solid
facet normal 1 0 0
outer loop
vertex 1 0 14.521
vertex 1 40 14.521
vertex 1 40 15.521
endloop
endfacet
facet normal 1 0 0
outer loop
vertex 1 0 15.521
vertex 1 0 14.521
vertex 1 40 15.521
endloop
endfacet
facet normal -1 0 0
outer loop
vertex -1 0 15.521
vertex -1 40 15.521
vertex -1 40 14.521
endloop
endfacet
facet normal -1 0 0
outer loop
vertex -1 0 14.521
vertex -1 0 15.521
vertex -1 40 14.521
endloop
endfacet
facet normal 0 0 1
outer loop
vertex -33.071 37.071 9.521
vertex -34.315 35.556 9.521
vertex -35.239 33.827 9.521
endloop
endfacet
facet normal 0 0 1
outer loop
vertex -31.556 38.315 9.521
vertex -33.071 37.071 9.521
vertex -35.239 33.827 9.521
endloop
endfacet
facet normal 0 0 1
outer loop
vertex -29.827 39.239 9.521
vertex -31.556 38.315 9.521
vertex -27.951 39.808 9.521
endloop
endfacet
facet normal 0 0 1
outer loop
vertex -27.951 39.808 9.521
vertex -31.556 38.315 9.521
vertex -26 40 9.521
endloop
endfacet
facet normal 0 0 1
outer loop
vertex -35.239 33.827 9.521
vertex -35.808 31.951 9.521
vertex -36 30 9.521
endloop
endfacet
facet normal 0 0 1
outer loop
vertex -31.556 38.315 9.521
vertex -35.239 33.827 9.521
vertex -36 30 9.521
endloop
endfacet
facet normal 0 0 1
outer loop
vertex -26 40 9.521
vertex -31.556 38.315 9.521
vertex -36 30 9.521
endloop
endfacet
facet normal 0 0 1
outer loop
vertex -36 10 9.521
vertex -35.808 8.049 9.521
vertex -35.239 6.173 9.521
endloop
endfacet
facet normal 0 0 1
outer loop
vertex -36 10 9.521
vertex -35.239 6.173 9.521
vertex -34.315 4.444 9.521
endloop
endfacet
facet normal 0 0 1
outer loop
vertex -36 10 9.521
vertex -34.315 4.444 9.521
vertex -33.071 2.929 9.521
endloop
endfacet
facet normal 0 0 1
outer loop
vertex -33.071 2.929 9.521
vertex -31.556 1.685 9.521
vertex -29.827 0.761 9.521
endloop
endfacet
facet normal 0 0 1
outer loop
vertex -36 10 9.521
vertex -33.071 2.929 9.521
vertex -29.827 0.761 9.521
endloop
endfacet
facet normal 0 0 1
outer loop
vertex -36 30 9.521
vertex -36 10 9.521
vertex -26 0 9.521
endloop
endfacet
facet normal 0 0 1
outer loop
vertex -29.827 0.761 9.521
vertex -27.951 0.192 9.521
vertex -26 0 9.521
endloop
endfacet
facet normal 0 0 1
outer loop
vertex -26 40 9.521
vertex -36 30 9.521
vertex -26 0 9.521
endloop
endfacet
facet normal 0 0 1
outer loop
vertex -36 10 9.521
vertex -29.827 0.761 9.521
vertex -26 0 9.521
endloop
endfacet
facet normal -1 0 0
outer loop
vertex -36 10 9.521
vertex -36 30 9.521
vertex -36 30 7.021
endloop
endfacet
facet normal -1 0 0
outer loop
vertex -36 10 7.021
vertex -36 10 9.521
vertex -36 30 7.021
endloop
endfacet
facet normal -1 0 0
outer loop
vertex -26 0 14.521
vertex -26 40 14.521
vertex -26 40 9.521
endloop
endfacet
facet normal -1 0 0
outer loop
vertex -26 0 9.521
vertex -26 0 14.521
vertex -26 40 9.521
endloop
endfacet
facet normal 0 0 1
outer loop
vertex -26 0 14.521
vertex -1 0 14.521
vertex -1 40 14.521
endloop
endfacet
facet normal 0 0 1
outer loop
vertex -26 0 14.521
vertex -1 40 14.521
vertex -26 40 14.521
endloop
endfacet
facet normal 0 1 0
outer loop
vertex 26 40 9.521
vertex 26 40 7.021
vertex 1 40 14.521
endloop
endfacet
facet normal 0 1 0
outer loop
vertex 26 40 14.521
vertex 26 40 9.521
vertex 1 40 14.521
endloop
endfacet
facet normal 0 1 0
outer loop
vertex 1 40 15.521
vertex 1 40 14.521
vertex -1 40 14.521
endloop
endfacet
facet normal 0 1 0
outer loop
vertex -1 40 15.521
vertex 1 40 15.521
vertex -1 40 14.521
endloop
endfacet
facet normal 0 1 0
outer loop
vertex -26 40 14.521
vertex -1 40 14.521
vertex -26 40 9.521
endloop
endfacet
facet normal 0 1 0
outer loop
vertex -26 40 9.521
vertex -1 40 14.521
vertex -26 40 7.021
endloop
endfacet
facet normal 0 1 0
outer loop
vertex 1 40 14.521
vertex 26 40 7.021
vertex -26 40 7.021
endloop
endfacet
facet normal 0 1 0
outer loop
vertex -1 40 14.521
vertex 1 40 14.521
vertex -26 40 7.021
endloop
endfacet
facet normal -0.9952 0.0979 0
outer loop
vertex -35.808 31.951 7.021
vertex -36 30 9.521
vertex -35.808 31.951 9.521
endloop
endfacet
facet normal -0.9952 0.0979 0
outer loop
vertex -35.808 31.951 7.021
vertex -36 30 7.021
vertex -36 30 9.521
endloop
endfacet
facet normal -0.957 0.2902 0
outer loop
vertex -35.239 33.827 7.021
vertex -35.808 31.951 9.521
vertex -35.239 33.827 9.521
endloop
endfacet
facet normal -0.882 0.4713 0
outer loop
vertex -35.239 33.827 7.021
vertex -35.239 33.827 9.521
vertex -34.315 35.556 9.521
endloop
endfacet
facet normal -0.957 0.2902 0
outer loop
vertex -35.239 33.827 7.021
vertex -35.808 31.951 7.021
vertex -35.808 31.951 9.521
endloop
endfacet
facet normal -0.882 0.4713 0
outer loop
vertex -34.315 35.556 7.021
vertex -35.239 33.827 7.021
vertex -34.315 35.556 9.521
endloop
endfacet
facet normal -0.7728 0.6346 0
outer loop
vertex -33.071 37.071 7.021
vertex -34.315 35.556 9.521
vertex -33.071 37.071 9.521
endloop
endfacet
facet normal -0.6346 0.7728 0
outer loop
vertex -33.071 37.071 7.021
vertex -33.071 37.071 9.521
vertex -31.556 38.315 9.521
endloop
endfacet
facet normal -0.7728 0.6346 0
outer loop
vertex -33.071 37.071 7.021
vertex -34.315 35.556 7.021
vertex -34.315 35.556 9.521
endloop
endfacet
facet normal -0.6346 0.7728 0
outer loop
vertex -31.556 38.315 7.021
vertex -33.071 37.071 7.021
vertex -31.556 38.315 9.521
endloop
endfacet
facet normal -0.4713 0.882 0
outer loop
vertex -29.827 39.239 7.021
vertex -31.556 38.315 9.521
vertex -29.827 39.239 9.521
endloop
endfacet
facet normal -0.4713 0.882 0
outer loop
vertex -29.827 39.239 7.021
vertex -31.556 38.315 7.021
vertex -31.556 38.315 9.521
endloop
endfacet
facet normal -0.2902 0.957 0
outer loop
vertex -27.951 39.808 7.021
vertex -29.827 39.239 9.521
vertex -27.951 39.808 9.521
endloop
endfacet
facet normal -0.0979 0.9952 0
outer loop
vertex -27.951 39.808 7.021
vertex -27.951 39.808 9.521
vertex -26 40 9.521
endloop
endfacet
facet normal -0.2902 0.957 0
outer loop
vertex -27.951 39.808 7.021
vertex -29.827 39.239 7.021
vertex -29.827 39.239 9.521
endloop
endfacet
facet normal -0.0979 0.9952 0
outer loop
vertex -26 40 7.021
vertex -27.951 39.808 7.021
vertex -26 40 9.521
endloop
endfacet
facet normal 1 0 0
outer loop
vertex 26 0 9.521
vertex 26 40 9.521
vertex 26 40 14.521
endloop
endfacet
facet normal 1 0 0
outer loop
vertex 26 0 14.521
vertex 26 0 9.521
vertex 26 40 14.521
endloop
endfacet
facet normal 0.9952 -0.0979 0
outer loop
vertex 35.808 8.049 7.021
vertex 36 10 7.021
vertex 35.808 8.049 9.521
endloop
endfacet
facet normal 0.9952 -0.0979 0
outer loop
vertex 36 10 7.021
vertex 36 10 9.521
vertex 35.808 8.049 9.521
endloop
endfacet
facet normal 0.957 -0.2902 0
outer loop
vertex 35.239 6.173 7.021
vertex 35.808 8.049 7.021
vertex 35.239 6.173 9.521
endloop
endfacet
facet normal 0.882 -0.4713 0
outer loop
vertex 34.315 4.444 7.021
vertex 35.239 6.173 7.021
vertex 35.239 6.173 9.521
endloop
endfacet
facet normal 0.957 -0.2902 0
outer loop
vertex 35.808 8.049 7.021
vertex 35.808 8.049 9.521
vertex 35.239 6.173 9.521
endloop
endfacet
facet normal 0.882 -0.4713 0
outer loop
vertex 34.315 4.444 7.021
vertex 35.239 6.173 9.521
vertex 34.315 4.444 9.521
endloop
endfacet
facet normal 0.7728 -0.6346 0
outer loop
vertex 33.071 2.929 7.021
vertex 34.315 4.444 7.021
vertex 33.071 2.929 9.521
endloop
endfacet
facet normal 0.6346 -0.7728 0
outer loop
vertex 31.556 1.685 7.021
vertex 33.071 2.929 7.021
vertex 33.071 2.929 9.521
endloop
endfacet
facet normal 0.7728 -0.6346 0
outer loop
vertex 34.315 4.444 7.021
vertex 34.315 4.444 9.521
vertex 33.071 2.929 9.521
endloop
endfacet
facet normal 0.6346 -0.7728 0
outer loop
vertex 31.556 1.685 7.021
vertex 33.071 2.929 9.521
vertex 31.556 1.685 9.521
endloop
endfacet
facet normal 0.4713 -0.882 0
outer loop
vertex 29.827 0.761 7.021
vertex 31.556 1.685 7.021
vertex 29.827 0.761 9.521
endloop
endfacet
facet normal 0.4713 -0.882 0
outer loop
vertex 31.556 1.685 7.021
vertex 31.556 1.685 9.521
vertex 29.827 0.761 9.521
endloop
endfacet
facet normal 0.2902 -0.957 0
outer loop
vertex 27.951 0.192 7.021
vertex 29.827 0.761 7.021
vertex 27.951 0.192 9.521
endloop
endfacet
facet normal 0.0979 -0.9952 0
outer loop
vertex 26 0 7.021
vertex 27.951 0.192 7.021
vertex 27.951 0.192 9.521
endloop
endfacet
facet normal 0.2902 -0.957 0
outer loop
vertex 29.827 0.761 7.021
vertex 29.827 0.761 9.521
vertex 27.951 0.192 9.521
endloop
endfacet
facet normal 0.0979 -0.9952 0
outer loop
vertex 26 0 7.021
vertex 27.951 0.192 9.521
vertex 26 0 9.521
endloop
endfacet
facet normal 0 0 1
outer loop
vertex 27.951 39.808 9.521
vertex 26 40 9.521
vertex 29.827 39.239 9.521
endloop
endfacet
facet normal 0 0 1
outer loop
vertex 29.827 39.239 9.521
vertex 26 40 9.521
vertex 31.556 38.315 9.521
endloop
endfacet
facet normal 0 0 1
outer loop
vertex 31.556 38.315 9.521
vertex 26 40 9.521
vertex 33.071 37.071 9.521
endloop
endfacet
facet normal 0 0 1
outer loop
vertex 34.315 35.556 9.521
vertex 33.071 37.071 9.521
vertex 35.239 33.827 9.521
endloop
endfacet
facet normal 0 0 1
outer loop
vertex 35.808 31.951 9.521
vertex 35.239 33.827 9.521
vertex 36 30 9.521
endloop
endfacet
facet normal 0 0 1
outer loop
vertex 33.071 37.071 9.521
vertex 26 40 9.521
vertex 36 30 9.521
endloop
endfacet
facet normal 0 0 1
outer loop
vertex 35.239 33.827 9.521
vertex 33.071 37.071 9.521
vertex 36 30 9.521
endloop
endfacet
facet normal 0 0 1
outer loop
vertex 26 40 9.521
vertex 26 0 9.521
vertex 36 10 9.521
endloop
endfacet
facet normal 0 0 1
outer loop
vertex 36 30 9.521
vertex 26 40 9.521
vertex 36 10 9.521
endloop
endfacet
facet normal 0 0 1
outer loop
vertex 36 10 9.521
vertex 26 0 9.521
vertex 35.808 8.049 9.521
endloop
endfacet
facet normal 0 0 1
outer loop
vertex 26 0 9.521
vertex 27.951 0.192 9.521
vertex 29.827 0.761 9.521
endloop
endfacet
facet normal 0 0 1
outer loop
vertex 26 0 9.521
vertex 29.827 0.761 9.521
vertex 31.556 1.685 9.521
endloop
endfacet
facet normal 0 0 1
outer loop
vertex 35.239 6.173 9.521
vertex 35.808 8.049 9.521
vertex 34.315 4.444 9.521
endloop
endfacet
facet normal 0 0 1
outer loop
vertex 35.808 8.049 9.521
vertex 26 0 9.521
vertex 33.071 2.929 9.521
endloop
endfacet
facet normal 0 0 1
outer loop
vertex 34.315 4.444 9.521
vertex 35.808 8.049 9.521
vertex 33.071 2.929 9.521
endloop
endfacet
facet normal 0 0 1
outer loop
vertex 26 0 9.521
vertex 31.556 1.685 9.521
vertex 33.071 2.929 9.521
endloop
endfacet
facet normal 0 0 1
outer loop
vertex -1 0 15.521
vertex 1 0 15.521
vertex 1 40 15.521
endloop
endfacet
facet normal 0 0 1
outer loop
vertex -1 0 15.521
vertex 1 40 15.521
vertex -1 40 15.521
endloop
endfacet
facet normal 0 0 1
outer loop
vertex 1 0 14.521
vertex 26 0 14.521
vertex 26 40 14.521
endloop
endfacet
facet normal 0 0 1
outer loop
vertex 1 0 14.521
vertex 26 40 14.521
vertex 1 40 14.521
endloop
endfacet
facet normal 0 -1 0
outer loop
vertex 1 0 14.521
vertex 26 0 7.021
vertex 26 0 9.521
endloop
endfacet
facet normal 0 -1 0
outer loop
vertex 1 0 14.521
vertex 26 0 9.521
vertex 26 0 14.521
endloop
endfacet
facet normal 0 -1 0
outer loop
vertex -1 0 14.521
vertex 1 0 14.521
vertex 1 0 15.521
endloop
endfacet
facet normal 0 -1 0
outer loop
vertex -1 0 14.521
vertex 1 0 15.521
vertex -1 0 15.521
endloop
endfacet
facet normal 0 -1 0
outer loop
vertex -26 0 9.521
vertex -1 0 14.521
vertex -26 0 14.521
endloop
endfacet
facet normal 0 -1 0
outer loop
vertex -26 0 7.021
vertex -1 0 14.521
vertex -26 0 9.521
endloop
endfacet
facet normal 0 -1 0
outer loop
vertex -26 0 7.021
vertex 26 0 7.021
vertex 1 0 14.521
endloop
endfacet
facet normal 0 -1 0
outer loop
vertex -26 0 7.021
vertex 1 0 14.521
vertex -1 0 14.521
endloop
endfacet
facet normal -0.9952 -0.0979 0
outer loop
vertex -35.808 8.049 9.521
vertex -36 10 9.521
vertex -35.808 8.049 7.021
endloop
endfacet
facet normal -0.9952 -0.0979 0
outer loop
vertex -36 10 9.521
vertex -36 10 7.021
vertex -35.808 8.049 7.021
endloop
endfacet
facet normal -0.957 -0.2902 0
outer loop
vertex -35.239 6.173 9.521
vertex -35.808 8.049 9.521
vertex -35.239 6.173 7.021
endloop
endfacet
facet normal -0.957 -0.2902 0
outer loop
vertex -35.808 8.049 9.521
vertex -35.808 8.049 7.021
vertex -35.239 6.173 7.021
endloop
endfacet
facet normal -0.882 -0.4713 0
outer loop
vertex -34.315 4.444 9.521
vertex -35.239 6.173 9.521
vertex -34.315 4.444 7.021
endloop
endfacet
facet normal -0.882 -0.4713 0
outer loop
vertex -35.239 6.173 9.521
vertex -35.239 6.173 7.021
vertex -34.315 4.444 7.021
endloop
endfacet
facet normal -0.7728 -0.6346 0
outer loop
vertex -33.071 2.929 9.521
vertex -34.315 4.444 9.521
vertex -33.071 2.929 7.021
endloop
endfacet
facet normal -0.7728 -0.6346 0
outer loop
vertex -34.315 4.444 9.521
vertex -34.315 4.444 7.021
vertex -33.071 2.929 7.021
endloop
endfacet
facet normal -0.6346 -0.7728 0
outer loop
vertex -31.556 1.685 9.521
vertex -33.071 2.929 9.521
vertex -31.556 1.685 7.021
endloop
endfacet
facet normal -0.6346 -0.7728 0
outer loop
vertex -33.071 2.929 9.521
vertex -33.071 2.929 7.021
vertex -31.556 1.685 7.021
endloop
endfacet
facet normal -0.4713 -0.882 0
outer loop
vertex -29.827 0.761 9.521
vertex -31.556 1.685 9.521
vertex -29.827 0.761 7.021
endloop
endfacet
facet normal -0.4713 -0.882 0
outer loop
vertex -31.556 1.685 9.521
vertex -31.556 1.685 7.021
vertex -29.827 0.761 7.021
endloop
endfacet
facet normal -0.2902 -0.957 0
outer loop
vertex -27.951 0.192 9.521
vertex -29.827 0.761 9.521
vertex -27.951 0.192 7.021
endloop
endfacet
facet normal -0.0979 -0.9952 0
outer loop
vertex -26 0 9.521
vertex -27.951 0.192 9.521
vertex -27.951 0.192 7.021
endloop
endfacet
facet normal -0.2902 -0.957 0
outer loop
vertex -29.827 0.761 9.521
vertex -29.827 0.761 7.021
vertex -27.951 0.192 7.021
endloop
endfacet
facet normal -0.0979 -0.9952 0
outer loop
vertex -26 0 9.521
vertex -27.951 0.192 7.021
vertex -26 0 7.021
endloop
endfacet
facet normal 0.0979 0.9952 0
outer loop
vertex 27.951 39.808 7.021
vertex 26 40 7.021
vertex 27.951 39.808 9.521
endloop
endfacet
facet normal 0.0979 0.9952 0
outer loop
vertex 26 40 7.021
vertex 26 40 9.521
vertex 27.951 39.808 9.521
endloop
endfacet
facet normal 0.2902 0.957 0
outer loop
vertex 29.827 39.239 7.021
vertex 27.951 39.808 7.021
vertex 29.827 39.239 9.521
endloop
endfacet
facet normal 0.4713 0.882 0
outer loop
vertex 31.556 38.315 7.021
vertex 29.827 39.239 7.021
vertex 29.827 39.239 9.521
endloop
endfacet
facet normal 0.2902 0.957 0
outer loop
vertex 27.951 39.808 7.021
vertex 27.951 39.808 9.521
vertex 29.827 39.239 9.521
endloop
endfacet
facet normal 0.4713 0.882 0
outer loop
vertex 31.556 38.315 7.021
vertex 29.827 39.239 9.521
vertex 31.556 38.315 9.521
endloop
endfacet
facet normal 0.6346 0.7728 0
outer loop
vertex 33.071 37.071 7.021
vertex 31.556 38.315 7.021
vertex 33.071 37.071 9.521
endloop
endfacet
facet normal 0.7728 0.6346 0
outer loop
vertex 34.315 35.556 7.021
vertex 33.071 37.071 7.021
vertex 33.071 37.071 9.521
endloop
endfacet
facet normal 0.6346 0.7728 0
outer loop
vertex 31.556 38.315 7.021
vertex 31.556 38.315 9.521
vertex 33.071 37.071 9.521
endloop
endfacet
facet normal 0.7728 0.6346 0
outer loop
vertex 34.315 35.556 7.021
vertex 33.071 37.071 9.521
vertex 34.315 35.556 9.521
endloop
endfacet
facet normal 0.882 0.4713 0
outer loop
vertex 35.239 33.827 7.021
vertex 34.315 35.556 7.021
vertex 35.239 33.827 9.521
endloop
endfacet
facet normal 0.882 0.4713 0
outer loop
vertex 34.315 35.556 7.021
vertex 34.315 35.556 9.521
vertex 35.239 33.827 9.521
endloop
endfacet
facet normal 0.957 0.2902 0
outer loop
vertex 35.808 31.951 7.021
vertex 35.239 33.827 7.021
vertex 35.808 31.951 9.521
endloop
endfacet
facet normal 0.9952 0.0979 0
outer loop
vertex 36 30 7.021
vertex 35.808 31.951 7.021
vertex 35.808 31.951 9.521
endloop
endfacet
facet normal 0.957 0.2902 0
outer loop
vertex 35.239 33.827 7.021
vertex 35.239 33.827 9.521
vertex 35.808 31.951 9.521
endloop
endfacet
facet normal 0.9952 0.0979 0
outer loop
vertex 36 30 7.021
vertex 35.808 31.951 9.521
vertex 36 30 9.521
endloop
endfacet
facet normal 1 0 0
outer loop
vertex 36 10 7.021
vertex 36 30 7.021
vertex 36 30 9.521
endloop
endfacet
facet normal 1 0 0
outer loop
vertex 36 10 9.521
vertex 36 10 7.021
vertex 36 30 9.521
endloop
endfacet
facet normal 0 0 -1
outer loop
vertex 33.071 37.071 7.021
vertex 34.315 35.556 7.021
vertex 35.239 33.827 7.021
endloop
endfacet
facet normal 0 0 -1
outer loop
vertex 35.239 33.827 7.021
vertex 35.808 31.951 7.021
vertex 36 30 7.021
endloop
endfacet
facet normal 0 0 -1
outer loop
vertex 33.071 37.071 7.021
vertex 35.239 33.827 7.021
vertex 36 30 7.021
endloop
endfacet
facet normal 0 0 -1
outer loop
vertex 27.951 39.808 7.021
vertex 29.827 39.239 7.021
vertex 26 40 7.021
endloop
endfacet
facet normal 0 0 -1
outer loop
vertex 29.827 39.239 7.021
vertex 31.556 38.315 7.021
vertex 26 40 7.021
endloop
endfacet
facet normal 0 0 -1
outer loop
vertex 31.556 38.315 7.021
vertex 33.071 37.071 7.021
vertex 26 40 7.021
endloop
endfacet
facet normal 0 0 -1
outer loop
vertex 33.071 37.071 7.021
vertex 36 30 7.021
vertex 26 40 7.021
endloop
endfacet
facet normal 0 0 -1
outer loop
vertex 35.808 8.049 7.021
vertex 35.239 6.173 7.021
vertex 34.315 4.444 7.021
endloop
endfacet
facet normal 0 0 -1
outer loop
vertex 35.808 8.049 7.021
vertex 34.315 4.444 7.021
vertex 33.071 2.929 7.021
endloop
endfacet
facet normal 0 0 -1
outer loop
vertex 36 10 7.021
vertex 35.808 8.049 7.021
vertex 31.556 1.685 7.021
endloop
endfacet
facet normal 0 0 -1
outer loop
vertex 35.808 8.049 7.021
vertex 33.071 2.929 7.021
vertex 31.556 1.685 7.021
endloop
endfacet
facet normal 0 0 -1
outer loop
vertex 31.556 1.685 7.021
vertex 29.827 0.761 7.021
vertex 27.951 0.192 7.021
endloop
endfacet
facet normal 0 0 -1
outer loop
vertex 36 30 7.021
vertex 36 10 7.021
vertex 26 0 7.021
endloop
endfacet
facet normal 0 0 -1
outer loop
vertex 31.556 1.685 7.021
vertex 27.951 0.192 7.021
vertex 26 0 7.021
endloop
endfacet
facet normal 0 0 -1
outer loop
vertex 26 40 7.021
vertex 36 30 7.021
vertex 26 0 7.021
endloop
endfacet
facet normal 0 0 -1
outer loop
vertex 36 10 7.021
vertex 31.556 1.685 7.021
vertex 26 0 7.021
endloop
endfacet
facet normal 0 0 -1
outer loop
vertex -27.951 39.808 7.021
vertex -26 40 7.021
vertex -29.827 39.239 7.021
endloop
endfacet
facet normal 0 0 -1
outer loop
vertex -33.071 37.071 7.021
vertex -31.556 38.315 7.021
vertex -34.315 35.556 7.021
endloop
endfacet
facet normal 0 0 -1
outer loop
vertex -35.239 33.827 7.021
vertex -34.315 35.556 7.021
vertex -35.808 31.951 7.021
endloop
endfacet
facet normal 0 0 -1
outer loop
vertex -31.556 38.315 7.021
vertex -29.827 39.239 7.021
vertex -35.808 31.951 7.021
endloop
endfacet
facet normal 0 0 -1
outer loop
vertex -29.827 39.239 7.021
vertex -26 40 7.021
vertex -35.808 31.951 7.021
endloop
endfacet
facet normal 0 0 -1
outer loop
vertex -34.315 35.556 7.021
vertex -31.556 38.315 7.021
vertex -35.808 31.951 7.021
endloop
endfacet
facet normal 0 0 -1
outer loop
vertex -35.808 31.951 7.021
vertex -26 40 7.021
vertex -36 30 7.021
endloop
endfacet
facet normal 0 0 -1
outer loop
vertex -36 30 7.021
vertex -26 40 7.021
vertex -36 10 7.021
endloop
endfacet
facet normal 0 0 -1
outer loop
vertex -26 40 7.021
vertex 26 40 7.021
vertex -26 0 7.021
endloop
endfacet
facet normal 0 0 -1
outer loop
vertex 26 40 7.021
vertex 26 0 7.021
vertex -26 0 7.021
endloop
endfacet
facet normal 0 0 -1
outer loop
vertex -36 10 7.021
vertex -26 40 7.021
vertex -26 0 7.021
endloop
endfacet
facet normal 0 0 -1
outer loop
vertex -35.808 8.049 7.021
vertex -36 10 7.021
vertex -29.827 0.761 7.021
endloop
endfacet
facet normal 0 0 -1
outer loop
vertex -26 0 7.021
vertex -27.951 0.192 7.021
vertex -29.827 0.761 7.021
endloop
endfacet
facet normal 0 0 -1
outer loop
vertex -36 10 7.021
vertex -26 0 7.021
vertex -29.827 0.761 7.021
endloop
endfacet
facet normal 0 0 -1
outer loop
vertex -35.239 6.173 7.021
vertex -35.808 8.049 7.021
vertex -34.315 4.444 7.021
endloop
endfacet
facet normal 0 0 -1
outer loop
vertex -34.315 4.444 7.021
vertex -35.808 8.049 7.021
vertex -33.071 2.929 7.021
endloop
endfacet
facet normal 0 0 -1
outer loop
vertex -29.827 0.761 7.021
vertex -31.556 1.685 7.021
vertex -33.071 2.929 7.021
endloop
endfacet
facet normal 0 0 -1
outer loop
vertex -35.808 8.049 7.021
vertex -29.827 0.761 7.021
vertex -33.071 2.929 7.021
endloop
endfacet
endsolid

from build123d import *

# Parameters (mm, degrees)
EXTRUDE_1_DEPTH = 40
FILLET_3_R      = 10
FILLET_6_R      = 10
FILLET_7_R      = 10
FILLET_8_R      = 10


with BuildPart() as part:
    # Эскиз1 → Бобышка-Вытянуть1 (new body)
    with BuildSketch(Plane(origin=(0, 0, 0), x_dir=(1, 0, 0), z_dir=(0, 1, 0))):
        Polygon((-26, -14.521028037), (-26, -9.521028037), (-32, -9.521028037), (-36, -9.521028037), (-36, -7.021028037), (-1, -7.021028037), (1, -7.021028037), (36, -7.021028037), (36, -9.521028037), (32, -9.521028037), (26, -9.521028037), (26, -14.521028037), (1, -14.521028037), (1, -15.521028037), (-1, -15.521028037), (-1, -14.521028037), align=None)
    extrude(amount=EXTRUDE_1_DEPTH)

    # Скругление3
    fillet_3_edges = [part.edges().sort_by_distance(p)[0] for p in [
        (-36, 40, 8.271028037),
    ]]
    fillet(fillet_3_edges, radius=FILLET_3_R)

    # Скругление6
    fillet_6_edges = [part.edges().sort_by_distance(p)[0] for p in [
        (-36, 0, 8.271028037),
    ]]
    fillet(fillet_6_edges, radius=FILLET_6_R)

    # Скругление7
    fillet_7_edges = [part.edges().sort_by_distance(p)[0] for p in [
        (36, 40, 8.271028037),
    ]]
    fillet(fillet_7_edges, radius=FILLET_7_R)

    # Скругление8
    fillet_8_edges = [part.edges().sort_by_distance(p)[0] for p in [
        (36, 0, 8.271028037),
    ]]
    fillet(fillet_8_edges, radius=FILLET_8_R)


solid = part.part
